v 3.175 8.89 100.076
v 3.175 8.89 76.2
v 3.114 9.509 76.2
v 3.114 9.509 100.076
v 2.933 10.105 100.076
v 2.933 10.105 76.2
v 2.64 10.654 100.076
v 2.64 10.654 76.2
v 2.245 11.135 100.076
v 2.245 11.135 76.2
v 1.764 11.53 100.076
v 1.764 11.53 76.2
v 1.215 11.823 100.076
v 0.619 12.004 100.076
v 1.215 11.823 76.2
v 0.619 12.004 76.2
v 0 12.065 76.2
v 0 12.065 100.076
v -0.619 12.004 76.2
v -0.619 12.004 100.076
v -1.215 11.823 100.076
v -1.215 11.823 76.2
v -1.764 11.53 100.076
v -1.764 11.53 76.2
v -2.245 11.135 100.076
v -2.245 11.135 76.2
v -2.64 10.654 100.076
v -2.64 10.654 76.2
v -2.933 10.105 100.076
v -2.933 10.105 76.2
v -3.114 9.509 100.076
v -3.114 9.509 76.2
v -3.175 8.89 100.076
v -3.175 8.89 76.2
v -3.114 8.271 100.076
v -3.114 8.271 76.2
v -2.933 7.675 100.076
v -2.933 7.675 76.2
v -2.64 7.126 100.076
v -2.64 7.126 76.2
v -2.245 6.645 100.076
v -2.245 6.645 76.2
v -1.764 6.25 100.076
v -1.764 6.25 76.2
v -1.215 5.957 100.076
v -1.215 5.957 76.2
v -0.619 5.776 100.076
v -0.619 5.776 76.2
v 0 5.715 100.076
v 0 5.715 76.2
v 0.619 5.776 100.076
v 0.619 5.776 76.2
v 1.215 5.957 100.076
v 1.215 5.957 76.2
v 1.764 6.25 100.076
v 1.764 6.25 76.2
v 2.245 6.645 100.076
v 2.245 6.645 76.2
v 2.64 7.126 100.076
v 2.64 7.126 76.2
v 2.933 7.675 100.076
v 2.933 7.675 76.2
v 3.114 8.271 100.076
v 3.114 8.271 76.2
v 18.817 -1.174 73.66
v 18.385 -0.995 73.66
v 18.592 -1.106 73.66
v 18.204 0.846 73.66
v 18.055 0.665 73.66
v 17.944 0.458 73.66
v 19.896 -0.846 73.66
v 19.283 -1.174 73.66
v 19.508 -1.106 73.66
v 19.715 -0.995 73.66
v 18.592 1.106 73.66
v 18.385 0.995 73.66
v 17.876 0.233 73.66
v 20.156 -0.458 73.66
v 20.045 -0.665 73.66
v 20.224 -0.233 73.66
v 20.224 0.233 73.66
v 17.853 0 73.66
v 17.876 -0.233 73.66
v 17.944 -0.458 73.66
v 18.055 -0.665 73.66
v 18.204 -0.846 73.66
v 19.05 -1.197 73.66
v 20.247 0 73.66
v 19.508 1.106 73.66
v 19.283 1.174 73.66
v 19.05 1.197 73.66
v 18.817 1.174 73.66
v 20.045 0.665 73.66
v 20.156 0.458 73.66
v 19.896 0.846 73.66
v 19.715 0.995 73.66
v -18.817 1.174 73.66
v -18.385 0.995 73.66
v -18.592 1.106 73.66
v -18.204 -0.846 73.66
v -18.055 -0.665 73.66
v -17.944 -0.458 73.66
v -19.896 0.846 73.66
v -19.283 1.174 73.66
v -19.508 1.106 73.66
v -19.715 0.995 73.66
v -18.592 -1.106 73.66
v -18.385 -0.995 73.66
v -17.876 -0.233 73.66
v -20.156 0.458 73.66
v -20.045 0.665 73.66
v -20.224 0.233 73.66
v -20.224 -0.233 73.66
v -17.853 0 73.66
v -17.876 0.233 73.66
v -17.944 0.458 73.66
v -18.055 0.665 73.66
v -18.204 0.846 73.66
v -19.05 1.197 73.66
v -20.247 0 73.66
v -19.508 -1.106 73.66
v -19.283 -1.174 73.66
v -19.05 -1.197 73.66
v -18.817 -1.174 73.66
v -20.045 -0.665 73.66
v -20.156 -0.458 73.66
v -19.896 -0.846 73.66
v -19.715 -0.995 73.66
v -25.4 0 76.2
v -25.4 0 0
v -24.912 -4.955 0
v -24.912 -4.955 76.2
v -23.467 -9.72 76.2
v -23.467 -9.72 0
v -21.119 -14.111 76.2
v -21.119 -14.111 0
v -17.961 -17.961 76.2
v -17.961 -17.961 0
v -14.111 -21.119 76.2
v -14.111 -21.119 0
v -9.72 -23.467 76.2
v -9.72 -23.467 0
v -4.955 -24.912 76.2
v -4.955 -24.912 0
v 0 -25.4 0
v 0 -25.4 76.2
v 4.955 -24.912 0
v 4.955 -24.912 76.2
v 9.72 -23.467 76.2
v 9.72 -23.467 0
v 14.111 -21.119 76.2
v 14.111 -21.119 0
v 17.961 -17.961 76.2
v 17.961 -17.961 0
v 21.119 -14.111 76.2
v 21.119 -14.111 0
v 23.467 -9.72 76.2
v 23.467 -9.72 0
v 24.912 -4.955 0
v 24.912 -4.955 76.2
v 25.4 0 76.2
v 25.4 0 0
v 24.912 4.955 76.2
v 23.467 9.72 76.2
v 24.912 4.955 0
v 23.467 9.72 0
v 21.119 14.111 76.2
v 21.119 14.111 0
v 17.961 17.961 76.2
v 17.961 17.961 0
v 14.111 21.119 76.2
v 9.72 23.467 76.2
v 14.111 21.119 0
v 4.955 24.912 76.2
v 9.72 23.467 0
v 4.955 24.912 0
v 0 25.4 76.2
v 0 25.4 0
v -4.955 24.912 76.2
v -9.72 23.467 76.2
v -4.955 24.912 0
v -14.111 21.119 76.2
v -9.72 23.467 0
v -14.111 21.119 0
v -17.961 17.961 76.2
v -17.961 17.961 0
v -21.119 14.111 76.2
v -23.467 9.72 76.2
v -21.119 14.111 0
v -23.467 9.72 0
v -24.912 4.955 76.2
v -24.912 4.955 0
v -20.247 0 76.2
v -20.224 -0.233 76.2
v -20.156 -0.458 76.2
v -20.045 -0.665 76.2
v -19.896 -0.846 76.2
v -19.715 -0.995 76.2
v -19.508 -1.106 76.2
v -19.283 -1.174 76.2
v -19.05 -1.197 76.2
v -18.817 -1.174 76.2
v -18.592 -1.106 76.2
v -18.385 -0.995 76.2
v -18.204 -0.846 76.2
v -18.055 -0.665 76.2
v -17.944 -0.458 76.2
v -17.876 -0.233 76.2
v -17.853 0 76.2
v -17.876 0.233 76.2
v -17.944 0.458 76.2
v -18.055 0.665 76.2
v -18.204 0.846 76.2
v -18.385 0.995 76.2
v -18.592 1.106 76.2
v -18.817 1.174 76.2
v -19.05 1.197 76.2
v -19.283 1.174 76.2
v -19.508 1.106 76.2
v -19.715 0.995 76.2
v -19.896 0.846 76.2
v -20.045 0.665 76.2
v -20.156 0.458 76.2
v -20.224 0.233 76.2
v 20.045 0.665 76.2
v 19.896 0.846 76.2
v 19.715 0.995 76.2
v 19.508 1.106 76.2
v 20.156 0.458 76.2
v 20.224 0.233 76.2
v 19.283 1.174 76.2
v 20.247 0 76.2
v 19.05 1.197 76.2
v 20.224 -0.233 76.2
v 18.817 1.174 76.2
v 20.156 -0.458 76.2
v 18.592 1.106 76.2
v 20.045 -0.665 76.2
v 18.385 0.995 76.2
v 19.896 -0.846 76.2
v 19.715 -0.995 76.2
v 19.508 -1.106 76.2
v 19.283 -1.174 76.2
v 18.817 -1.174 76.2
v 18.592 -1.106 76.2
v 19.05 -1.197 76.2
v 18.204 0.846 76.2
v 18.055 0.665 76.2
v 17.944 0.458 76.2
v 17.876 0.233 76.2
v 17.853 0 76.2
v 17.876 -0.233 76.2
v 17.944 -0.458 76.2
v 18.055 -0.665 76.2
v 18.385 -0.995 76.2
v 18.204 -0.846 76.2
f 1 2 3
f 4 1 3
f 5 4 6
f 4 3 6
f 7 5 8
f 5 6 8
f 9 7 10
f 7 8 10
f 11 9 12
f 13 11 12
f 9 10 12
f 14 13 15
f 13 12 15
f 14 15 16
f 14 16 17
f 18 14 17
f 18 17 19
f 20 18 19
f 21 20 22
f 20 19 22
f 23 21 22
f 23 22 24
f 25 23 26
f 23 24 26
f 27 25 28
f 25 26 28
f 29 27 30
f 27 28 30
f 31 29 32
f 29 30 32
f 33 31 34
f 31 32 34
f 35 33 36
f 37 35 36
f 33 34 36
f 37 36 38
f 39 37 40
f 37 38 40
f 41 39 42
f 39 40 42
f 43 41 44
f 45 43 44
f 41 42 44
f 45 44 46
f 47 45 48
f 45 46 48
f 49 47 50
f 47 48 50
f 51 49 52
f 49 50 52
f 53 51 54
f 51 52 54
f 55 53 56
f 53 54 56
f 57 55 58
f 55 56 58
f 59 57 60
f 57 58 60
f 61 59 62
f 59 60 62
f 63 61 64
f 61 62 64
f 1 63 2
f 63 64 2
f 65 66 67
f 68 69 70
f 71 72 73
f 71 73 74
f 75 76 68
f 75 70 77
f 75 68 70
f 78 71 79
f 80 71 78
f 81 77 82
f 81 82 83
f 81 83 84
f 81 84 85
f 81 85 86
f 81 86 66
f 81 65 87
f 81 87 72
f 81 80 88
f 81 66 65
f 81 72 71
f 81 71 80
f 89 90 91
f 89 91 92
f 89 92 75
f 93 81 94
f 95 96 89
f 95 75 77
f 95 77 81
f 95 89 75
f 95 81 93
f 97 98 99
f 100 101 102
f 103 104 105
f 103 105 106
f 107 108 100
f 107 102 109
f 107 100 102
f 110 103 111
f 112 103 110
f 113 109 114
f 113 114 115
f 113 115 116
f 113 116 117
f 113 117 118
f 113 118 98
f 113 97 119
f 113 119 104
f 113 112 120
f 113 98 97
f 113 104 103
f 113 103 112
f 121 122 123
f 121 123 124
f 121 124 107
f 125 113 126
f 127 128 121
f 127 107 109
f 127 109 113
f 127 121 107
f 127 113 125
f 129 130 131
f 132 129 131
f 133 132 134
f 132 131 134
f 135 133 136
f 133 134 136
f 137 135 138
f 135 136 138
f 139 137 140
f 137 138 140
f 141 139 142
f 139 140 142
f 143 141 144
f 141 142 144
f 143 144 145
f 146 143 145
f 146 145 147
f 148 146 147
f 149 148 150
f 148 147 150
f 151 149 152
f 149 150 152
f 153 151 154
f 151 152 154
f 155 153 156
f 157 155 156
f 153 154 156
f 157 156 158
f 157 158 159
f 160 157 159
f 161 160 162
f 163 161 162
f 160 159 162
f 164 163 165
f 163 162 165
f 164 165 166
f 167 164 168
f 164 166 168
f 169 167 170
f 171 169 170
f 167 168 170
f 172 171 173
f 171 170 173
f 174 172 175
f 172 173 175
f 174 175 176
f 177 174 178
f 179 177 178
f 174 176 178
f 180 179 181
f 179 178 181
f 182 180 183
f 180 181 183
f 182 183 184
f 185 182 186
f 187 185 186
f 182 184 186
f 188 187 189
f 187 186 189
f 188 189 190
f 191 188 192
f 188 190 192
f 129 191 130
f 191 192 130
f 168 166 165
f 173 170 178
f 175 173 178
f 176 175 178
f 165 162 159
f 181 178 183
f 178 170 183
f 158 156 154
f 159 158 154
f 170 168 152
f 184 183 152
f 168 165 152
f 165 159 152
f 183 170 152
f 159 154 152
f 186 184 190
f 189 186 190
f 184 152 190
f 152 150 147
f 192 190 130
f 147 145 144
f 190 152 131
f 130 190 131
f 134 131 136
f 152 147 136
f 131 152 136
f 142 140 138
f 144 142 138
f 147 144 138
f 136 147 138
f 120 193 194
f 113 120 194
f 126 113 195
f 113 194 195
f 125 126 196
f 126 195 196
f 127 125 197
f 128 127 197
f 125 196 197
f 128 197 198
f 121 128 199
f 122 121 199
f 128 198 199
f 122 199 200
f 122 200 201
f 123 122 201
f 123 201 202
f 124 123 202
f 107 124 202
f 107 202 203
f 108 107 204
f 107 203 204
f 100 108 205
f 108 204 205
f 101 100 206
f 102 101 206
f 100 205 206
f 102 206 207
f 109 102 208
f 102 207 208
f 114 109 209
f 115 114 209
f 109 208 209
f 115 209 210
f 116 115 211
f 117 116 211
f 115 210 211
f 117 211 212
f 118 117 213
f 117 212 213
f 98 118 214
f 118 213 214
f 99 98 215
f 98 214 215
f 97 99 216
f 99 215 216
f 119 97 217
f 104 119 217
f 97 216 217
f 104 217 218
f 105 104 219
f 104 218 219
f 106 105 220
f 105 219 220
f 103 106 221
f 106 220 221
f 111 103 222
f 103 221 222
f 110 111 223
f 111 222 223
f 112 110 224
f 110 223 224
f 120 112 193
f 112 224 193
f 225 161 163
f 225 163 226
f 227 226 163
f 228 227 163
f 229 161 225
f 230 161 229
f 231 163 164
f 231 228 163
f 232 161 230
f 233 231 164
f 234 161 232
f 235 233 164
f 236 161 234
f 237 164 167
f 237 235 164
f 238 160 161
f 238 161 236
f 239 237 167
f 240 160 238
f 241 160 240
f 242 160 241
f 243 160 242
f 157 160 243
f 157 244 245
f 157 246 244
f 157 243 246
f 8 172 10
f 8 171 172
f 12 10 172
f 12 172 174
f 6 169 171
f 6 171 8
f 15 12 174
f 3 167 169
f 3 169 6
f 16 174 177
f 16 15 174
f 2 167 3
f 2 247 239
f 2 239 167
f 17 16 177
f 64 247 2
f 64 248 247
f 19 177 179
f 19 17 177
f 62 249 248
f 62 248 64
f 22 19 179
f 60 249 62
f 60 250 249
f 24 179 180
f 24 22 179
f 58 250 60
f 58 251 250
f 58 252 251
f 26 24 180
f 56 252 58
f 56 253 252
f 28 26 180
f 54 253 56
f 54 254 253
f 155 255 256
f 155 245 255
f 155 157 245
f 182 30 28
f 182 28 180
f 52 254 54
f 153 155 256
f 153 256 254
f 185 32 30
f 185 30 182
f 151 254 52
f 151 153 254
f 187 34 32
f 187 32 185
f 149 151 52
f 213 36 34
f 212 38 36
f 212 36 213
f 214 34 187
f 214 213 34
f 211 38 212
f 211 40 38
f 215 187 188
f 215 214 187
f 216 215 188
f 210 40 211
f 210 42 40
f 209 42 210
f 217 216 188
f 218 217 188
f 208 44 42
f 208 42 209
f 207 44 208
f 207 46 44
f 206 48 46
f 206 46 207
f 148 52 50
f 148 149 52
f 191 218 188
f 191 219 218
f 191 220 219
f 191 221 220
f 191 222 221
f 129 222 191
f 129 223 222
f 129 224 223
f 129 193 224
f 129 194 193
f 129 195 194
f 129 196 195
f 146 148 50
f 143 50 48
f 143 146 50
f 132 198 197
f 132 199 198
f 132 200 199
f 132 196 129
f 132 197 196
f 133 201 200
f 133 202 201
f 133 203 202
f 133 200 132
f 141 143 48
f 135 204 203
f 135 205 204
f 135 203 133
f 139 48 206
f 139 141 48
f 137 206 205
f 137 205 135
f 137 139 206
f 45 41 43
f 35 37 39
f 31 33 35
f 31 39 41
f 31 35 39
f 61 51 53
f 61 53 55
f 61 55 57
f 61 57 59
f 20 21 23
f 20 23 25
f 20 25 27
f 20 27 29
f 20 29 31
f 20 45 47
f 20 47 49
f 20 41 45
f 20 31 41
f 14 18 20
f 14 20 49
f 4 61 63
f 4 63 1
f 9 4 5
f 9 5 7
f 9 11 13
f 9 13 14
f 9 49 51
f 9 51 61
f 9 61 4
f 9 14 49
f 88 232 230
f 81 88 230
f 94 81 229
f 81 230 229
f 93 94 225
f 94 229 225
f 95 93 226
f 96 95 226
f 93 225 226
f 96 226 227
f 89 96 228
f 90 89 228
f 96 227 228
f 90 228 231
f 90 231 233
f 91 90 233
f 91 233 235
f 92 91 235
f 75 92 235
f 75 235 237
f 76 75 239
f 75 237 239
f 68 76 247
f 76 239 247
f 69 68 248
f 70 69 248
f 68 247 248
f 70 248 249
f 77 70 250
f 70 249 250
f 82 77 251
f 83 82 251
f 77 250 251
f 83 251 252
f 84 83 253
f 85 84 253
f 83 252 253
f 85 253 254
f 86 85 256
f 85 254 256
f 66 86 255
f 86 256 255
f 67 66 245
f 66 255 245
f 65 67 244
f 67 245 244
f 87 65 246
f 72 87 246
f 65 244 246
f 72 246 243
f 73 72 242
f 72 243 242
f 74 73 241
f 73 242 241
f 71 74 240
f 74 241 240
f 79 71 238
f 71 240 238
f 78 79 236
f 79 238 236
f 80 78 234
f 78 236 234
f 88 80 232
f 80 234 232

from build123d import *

# Parameters (mm, degrees)
SKETCH1_R           = 25.4
BOSS_EXTRUDE1_DEPTH = 76.2
SKETCH2_R           = 3.175
BOSS_EXTRUDE2_DEPTH = 23.876
SKETCH3_R           = 1.19681919
CUT_EXTRUDE1_DEPTH  = 2.54


with BuildPart() as part:
    # Sketch1 → Boss-Extrude1 (new body)
    with BuildSketch(Plane.XY):
        with Locations(Location((0, 0, 0), (0, 0, 180))):
            Circle(SKETCH1_R)
    extrude(amount=BOSS_EXTRUDE1_DEPTH)

    # Sketch2 → Boss-Extrude2 (add)
    with BuildSketch(Plane.XY.offset(76.2)):
        with Locations((0, 8.89)):
            Circle(SKETCH2_R)
    extrude(amount=BOSS_EXTRUDE2_DEPTH)

    # Sketch3 → Cut-Extrude1 (cut)
    with BuildSketch(Plane.XY.offset(76.2)):
        with Locations((19.05, 0)):
            Circle(SKETCH3_R)
        with Locations(Location((-19.05, 0, 0), (0, 0, 180))):
            Circle(SKETCH3_R)
    extrude(amount=-CUT_EXTRUDE1_DEPTH, mode=Mode.SUBTRACT)


solid = part.part
